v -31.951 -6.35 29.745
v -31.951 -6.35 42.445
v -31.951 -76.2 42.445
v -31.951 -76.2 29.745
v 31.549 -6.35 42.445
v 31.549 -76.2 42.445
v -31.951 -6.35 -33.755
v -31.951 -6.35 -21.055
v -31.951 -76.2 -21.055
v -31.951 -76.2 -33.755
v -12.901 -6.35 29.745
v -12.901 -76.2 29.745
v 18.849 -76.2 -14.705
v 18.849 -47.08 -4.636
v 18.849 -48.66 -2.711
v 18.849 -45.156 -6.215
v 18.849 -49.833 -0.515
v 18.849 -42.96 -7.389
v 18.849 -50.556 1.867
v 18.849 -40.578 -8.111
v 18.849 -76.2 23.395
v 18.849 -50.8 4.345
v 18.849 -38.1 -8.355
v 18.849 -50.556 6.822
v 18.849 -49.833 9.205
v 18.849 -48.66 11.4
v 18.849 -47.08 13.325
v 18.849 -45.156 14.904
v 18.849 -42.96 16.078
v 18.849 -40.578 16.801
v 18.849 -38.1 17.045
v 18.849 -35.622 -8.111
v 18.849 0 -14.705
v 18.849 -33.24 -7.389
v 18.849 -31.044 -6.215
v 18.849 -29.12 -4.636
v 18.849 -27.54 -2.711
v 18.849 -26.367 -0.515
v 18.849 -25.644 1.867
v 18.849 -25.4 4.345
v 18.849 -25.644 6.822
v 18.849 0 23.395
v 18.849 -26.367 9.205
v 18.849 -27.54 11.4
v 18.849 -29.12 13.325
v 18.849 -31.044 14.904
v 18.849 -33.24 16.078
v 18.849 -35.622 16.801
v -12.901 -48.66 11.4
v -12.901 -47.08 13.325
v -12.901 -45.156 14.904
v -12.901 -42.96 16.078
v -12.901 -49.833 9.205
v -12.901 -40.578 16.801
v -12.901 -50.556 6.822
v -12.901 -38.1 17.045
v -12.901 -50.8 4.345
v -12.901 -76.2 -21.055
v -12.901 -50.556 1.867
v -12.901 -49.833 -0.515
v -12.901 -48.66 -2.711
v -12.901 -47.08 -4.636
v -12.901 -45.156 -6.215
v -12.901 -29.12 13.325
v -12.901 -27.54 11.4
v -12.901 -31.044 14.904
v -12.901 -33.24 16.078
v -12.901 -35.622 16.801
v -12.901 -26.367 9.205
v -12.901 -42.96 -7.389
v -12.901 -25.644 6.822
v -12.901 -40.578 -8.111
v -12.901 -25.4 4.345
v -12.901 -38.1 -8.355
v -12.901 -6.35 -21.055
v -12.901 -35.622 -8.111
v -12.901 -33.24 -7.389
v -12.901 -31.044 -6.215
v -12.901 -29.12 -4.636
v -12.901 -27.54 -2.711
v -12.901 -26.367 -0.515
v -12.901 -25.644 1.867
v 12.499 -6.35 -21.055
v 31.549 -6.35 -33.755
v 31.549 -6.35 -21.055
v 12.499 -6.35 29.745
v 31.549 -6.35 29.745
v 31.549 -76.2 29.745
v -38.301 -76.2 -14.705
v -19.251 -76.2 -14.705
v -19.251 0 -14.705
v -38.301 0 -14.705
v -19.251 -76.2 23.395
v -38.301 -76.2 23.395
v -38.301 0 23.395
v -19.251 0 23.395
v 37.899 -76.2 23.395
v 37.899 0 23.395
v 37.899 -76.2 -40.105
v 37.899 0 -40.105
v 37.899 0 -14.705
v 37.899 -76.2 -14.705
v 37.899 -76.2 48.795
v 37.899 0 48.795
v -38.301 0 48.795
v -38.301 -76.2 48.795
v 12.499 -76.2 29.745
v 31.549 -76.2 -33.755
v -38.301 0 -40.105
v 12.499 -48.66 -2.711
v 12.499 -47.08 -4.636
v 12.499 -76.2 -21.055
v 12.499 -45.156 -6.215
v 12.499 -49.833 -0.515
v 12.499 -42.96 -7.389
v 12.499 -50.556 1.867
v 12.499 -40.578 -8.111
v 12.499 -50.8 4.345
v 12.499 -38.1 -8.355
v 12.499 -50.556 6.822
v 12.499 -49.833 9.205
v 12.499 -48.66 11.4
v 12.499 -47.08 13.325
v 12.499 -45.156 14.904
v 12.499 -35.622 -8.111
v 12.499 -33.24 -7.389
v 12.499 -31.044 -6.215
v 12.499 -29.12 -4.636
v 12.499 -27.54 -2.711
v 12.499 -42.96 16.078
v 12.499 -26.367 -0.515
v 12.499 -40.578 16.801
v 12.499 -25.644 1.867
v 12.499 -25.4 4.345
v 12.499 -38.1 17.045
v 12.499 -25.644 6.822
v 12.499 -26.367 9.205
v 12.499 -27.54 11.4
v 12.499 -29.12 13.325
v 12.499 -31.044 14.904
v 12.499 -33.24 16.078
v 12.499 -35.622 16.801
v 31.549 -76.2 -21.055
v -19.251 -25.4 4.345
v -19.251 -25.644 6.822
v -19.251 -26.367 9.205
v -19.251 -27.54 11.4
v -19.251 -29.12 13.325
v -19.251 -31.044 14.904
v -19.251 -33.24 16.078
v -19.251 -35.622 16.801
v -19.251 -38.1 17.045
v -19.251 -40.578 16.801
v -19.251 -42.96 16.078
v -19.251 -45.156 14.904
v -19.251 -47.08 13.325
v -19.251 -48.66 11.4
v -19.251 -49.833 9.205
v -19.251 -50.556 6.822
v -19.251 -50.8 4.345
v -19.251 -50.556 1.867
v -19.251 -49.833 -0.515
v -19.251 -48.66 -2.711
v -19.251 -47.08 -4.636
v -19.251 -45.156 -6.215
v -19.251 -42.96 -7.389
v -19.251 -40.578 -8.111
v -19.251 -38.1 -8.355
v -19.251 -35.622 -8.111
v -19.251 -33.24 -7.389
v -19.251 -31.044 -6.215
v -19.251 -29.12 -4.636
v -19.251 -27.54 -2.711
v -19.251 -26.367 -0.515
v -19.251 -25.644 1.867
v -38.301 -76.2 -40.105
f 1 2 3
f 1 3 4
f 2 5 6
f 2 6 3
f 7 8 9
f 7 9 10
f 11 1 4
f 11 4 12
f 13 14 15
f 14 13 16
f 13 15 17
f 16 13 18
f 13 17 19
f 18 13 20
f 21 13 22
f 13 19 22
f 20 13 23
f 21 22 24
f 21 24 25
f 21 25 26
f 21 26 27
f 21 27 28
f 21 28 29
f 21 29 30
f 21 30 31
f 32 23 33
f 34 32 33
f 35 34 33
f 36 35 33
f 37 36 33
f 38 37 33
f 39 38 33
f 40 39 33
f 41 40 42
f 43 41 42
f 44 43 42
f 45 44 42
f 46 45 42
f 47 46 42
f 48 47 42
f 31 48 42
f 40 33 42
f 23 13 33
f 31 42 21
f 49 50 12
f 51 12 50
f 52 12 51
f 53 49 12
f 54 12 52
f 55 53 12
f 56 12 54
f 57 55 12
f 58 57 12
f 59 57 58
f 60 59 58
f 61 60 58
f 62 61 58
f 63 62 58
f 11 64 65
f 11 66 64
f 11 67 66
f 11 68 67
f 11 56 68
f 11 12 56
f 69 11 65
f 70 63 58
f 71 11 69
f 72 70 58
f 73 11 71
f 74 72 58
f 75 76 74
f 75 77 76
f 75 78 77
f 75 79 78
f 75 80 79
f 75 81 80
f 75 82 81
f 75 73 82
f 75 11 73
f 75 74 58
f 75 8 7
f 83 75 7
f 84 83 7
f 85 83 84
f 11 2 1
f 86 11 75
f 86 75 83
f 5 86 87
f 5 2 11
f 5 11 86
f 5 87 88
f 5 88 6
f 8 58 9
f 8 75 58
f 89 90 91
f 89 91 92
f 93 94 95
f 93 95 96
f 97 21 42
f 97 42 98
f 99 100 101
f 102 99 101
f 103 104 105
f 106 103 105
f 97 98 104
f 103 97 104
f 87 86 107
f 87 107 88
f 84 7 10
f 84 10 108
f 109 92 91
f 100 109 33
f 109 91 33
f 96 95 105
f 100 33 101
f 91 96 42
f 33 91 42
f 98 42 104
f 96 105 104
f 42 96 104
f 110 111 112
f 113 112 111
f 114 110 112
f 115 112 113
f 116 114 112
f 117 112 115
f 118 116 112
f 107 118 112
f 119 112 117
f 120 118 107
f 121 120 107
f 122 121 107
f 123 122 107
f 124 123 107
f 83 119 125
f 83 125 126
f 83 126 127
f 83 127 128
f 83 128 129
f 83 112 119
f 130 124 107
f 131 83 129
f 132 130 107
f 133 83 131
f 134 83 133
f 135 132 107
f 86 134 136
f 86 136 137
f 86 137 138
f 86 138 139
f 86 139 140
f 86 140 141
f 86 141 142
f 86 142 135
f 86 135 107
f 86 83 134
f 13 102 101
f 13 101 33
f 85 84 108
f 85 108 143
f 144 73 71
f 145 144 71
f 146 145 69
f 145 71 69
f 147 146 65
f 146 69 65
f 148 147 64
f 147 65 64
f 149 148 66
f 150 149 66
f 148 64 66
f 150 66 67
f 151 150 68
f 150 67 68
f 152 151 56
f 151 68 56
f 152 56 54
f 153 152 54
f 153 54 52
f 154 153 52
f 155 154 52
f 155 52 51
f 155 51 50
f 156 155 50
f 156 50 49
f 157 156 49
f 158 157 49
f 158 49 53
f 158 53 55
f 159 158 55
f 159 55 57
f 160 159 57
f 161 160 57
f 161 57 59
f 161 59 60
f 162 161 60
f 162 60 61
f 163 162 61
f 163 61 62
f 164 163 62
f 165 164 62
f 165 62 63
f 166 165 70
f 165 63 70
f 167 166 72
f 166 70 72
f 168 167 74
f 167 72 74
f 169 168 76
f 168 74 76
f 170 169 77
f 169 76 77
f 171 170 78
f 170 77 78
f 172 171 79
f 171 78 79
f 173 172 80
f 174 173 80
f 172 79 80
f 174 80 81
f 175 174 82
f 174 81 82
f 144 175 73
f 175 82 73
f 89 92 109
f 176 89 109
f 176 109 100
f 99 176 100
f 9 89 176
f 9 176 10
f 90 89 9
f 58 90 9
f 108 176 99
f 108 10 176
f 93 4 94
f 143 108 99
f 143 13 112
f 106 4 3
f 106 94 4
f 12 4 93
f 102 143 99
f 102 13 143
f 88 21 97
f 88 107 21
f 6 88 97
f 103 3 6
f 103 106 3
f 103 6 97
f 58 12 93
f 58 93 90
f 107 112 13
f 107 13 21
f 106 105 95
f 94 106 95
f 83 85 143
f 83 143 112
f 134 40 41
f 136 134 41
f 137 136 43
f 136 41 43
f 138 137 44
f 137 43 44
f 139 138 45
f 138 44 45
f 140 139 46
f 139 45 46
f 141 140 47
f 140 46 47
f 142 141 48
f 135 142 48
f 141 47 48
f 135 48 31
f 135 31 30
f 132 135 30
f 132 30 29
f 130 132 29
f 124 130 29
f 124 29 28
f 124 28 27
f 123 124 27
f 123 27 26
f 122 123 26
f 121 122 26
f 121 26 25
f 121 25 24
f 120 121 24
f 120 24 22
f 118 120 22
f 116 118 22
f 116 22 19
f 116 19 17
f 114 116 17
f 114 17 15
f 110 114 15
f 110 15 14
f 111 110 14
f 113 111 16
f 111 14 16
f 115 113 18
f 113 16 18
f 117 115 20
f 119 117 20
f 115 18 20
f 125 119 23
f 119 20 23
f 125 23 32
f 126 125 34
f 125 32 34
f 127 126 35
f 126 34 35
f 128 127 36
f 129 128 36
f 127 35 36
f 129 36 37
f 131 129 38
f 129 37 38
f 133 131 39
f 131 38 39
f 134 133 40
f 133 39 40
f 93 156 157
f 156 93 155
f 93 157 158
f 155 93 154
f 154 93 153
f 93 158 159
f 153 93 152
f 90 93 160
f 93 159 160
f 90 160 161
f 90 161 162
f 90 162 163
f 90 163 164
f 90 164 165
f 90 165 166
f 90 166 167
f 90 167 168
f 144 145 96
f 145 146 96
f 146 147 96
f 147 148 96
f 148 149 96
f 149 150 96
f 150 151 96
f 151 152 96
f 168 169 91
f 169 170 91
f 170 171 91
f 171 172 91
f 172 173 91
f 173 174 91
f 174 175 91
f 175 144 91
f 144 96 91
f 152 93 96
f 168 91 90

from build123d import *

# Parameters (mm, degrees)
F1_DEPTH = 76.2
F2_T     = -6.35
F3_R     = 12.7
F4_DEPTH = 57.151


with BuildPart() as f1:
    # F0 (on Front) → F1 (new body)
    with BuildSketch(Plane.XZ):
        Polygon((-38.3005267888, -14.7052646339), (-38.3005267888, -40.1052646339), (37.8994732112, -40.1052646339), (37.8994732112, -14.7052646339), (18.8494732112, -14.7052646339), (18.8494732112, 23.3947353661), (37.8994732112, 23.3947353661), (37.8994732112, 48.7947353661), (-38.3005267888, 48.7947353661), (-38.3005267888, 23.3947353661), (-19.2505267888, 23.3947353661), (-19.2505267888, -14.7052646339), align=None)
    extrude(amount=F1_DEPTH)

    # F2
    f2_openings = [f1.faces().sort_by_distance(p)[0] for p in [
        (-0.200527, -76.2, 4.344735),
    ]]
    offset(amount=F2_T, openings=f2_openings, kind=Kind.INTERSECTION)

    # F3 (on face) → F4 (cut, through all)
    with BuildSketch(Plane.YZ.offset(18.8494732112)):
        with Locations((-38.1, 4.3447353661)):
            Circle(F3_R)
    extrude(amount=-F4_DEPTH, mode=Mode.SUBTRACT)


solid = f1.part
